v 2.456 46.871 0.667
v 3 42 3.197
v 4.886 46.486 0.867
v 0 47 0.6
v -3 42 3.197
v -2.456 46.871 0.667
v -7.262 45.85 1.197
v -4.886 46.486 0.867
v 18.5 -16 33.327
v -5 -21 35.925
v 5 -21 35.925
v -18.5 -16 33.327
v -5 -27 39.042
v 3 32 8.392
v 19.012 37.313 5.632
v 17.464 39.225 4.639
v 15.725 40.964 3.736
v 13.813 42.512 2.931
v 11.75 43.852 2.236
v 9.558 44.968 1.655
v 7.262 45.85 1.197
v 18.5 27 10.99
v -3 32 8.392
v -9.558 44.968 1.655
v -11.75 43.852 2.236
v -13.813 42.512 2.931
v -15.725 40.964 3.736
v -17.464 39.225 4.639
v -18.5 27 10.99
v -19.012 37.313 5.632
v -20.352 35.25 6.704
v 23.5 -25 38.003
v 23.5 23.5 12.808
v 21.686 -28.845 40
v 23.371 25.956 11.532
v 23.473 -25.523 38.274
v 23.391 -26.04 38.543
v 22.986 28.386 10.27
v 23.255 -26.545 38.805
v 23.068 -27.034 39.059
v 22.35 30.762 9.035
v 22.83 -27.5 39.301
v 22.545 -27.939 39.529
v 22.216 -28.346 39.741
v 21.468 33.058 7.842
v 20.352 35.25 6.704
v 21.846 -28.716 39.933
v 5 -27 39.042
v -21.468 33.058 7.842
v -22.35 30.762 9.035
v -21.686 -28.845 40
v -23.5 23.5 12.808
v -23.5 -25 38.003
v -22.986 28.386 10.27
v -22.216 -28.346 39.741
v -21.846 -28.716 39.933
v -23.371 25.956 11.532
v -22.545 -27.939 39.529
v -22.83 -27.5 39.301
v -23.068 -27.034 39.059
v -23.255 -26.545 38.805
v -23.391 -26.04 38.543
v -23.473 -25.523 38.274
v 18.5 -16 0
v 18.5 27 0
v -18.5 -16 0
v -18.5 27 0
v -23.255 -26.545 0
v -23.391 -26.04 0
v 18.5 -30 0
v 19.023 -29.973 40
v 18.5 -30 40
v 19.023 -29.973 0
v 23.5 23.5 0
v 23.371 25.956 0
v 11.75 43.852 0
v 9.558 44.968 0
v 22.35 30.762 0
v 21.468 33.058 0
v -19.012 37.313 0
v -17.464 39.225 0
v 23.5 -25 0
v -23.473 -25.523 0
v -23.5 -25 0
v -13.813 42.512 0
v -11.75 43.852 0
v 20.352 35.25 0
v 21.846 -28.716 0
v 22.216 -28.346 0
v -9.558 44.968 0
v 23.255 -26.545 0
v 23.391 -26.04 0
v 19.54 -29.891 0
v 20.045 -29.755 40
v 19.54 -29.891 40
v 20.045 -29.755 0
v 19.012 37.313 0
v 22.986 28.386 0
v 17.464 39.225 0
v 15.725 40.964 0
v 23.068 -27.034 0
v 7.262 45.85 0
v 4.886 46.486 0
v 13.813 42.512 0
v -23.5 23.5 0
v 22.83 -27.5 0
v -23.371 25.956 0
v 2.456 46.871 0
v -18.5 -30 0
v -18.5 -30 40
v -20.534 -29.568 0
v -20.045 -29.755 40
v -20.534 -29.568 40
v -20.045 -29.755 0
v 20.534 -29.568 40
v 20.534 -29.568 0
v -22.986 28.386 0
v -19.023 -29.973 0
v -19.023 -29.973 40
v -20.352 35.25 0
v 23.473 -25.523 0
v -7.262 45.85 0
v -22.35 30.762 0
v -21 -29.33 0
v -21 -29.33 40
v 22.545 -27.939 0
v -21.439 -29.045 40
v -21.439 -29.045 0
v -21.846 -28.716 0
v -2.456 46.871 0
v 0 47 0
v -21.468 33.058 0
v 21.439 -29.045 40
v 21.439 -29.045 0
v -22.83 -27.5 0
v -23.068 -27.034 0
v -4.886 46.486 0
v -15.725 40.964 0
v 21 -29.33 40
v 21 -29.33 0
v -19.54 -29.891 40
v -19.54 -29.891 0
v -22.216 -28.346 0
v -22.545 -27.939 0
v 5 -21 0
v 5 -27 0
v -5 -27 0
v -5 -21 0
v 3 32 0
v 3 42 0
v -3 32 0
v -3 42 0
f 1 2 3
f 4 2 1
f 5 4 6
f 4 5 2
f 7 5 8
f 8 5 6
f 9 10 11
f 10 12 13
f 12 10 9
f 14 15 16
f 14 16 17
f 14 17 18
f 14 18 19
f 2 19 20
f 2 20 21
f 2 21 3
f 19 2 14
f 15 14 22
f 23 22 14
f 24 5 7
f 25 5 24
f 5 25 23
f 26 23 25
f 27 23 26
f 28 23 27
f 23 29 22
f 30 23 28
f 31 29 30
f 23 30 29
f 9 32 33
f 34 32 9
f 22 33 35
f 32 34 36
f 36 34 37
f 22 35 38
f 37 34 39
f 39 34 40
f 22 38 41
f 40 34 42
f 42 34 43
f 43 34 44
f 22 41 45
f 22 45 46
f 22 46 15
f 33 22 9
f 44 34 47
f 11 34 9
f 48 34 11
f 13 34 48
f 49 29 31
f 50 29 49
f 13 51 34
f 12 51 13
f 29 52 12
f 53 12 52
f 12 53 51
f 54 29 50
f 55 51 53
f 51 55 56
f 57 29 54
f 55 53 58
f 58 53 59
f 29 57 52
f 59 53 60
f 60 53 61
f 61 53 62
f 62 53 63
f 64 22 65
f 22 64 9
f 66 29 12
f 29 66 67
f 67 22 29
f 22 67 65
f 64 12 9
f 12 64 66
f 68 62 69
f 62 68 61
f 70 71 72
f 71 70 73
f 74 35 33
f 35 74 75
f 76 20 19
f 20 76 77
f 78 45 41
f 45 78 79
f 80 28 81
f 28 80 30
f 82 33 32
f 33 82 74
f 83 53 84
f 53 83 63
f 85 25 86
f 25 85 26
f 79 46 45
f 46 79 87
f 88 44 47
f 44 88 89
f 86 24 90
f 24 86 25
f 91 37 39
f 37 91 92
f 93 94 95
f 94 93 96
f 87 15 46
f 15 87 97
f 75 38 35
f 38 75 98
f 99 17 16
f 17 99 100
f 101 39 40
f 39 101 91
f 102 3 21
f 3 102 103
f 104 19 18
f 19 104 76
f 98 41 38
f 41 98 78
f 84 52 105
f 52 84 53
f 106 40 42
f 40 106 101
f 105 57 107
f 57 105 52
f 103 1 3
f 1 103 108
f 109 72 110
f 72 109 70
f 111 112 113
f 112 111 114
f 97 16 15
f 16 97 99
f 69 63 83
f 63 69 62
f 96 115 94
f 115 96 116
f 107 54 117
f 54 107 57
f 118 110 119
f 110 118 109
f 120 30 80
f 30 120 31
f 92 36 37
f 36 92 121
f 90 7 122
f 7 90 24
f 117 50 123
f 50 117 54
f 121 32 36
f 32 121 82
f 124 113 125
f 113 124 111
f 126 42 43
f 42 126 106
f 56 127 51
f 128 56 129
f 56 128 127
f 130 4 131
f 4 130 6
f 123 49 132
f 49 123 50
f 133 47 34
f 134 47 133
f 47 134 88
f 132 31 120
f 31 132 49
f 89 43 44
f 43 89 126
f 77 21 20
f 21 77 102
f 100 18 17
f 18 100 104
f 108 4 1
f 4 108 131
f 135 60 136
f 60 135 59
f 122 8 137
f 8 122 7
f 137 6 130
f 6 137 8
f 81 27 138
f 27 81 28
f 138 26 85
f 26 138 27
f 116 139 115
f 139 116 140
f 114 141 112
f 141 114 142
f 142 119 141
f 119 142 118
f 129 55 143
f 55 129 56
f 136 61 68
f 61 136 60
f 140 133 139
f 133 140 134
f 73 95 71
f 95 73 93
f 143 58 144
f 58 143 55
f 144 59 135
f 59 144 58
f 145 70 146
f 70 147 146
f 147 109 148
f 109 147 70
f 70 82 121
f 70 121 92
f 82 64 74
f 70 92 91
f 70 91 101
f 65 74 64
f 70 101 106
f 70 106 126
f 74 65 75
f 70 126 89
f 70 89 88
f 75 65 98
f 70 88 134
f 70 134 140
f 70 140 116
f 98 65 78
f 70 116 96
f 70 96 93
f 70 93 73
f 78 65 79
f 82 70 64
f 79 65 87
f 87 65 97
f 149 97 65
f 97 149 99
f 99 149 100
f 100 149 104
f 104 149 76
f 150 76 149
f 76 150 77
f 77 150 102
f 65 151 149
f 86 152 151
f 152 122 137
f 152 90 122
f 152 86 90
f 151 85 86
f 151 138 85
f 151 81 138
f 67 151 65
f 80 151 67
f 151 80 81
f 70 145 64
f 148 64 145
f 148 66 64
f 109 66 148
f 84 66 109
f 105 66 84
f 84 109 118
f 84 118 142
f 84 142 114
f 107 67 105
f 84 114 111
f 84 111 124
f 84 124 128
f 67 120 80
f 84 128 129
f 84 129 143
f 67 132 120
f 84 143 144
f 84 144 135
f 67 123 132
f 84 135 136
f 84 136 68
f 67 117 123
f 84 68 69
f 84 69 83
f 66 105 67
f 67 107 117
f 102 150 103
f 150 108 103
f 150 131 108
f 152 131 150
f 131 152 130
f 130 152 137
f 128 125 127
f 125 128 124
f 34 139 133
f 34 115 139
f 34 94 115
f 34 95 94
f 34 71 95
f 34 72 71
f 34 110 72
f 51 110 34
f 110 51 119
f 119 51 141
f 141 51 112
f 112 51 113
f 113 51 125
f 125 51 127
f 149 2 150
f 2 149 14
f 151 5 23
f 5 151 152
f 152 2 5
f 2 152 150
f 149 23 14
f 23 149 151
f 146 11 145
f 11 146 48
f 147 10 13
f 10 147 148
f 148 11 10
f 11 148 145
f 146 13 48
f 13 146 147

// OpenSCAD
/** cale pour support enceintes */

// preview[view:north east, tilt:top diagonal]

/* [Global] */

// height of the bottom (mm)
haut = 40; // [0:100]
// Inside hole ?
in_hole="yes"; // [yes,no]
// wall thickness of the inside hole (mm)
thick = 5;

/* [Hidden] */
// width of the base
larg = 47;
// height of the base
long = 77;

$fn=60;

lsq=long-larg/2; // longueur "square"
scircle=10; // diametre petits cercles
dy=-(lsq-larg/2-scircle/2); // decalage centre petits cercles

// main base
module base () {
	linear_extrude (haut) {
		hull() {
			translate([0,larg/2,0]) circle (d=larg);
			translate ([  larg/2-scircle/2, dy,0]) circle(d=scircle);
			translate ([-(larg/2-scircle/2),dy,0]) circle(d=scircle);
		}
	}
}

cut_long=sqrt(haut*haut+long*long); // length of the cut. Yeah! Pytagore
alpha=atan(haut/long); // angle of the cut

// angle cut
module cut() {
	// angle cutting
	translate([-1,dy-scircle/2,haut+0.6])
		rotate([-alpha,0,0])
			translate([-larg/2,0,0])
				cube([larg+2, cut_long, haut]);
	// inside cutting
	if (in_hole == "yes") {
		in_larg=larg-2*thick;
		in_long=long-2*thick-10-3-5-6;
		translate([-(in_larg)/2,dy-scircle/2+3+thick+6,-1])
			cube([in_larg, in_long, haut+2]);
	}
}

// MAIN
difference() {
	base();
	cut();
	translate([-3,larg-10-5,-1]) cube ([6,10,haut+2]); // top hole, 5mm from top
	translate([-5,dy-scircle/2+3,-1]) cube ([10,6,haut+2]); // bnottom hole, 3mm from bottom
}
